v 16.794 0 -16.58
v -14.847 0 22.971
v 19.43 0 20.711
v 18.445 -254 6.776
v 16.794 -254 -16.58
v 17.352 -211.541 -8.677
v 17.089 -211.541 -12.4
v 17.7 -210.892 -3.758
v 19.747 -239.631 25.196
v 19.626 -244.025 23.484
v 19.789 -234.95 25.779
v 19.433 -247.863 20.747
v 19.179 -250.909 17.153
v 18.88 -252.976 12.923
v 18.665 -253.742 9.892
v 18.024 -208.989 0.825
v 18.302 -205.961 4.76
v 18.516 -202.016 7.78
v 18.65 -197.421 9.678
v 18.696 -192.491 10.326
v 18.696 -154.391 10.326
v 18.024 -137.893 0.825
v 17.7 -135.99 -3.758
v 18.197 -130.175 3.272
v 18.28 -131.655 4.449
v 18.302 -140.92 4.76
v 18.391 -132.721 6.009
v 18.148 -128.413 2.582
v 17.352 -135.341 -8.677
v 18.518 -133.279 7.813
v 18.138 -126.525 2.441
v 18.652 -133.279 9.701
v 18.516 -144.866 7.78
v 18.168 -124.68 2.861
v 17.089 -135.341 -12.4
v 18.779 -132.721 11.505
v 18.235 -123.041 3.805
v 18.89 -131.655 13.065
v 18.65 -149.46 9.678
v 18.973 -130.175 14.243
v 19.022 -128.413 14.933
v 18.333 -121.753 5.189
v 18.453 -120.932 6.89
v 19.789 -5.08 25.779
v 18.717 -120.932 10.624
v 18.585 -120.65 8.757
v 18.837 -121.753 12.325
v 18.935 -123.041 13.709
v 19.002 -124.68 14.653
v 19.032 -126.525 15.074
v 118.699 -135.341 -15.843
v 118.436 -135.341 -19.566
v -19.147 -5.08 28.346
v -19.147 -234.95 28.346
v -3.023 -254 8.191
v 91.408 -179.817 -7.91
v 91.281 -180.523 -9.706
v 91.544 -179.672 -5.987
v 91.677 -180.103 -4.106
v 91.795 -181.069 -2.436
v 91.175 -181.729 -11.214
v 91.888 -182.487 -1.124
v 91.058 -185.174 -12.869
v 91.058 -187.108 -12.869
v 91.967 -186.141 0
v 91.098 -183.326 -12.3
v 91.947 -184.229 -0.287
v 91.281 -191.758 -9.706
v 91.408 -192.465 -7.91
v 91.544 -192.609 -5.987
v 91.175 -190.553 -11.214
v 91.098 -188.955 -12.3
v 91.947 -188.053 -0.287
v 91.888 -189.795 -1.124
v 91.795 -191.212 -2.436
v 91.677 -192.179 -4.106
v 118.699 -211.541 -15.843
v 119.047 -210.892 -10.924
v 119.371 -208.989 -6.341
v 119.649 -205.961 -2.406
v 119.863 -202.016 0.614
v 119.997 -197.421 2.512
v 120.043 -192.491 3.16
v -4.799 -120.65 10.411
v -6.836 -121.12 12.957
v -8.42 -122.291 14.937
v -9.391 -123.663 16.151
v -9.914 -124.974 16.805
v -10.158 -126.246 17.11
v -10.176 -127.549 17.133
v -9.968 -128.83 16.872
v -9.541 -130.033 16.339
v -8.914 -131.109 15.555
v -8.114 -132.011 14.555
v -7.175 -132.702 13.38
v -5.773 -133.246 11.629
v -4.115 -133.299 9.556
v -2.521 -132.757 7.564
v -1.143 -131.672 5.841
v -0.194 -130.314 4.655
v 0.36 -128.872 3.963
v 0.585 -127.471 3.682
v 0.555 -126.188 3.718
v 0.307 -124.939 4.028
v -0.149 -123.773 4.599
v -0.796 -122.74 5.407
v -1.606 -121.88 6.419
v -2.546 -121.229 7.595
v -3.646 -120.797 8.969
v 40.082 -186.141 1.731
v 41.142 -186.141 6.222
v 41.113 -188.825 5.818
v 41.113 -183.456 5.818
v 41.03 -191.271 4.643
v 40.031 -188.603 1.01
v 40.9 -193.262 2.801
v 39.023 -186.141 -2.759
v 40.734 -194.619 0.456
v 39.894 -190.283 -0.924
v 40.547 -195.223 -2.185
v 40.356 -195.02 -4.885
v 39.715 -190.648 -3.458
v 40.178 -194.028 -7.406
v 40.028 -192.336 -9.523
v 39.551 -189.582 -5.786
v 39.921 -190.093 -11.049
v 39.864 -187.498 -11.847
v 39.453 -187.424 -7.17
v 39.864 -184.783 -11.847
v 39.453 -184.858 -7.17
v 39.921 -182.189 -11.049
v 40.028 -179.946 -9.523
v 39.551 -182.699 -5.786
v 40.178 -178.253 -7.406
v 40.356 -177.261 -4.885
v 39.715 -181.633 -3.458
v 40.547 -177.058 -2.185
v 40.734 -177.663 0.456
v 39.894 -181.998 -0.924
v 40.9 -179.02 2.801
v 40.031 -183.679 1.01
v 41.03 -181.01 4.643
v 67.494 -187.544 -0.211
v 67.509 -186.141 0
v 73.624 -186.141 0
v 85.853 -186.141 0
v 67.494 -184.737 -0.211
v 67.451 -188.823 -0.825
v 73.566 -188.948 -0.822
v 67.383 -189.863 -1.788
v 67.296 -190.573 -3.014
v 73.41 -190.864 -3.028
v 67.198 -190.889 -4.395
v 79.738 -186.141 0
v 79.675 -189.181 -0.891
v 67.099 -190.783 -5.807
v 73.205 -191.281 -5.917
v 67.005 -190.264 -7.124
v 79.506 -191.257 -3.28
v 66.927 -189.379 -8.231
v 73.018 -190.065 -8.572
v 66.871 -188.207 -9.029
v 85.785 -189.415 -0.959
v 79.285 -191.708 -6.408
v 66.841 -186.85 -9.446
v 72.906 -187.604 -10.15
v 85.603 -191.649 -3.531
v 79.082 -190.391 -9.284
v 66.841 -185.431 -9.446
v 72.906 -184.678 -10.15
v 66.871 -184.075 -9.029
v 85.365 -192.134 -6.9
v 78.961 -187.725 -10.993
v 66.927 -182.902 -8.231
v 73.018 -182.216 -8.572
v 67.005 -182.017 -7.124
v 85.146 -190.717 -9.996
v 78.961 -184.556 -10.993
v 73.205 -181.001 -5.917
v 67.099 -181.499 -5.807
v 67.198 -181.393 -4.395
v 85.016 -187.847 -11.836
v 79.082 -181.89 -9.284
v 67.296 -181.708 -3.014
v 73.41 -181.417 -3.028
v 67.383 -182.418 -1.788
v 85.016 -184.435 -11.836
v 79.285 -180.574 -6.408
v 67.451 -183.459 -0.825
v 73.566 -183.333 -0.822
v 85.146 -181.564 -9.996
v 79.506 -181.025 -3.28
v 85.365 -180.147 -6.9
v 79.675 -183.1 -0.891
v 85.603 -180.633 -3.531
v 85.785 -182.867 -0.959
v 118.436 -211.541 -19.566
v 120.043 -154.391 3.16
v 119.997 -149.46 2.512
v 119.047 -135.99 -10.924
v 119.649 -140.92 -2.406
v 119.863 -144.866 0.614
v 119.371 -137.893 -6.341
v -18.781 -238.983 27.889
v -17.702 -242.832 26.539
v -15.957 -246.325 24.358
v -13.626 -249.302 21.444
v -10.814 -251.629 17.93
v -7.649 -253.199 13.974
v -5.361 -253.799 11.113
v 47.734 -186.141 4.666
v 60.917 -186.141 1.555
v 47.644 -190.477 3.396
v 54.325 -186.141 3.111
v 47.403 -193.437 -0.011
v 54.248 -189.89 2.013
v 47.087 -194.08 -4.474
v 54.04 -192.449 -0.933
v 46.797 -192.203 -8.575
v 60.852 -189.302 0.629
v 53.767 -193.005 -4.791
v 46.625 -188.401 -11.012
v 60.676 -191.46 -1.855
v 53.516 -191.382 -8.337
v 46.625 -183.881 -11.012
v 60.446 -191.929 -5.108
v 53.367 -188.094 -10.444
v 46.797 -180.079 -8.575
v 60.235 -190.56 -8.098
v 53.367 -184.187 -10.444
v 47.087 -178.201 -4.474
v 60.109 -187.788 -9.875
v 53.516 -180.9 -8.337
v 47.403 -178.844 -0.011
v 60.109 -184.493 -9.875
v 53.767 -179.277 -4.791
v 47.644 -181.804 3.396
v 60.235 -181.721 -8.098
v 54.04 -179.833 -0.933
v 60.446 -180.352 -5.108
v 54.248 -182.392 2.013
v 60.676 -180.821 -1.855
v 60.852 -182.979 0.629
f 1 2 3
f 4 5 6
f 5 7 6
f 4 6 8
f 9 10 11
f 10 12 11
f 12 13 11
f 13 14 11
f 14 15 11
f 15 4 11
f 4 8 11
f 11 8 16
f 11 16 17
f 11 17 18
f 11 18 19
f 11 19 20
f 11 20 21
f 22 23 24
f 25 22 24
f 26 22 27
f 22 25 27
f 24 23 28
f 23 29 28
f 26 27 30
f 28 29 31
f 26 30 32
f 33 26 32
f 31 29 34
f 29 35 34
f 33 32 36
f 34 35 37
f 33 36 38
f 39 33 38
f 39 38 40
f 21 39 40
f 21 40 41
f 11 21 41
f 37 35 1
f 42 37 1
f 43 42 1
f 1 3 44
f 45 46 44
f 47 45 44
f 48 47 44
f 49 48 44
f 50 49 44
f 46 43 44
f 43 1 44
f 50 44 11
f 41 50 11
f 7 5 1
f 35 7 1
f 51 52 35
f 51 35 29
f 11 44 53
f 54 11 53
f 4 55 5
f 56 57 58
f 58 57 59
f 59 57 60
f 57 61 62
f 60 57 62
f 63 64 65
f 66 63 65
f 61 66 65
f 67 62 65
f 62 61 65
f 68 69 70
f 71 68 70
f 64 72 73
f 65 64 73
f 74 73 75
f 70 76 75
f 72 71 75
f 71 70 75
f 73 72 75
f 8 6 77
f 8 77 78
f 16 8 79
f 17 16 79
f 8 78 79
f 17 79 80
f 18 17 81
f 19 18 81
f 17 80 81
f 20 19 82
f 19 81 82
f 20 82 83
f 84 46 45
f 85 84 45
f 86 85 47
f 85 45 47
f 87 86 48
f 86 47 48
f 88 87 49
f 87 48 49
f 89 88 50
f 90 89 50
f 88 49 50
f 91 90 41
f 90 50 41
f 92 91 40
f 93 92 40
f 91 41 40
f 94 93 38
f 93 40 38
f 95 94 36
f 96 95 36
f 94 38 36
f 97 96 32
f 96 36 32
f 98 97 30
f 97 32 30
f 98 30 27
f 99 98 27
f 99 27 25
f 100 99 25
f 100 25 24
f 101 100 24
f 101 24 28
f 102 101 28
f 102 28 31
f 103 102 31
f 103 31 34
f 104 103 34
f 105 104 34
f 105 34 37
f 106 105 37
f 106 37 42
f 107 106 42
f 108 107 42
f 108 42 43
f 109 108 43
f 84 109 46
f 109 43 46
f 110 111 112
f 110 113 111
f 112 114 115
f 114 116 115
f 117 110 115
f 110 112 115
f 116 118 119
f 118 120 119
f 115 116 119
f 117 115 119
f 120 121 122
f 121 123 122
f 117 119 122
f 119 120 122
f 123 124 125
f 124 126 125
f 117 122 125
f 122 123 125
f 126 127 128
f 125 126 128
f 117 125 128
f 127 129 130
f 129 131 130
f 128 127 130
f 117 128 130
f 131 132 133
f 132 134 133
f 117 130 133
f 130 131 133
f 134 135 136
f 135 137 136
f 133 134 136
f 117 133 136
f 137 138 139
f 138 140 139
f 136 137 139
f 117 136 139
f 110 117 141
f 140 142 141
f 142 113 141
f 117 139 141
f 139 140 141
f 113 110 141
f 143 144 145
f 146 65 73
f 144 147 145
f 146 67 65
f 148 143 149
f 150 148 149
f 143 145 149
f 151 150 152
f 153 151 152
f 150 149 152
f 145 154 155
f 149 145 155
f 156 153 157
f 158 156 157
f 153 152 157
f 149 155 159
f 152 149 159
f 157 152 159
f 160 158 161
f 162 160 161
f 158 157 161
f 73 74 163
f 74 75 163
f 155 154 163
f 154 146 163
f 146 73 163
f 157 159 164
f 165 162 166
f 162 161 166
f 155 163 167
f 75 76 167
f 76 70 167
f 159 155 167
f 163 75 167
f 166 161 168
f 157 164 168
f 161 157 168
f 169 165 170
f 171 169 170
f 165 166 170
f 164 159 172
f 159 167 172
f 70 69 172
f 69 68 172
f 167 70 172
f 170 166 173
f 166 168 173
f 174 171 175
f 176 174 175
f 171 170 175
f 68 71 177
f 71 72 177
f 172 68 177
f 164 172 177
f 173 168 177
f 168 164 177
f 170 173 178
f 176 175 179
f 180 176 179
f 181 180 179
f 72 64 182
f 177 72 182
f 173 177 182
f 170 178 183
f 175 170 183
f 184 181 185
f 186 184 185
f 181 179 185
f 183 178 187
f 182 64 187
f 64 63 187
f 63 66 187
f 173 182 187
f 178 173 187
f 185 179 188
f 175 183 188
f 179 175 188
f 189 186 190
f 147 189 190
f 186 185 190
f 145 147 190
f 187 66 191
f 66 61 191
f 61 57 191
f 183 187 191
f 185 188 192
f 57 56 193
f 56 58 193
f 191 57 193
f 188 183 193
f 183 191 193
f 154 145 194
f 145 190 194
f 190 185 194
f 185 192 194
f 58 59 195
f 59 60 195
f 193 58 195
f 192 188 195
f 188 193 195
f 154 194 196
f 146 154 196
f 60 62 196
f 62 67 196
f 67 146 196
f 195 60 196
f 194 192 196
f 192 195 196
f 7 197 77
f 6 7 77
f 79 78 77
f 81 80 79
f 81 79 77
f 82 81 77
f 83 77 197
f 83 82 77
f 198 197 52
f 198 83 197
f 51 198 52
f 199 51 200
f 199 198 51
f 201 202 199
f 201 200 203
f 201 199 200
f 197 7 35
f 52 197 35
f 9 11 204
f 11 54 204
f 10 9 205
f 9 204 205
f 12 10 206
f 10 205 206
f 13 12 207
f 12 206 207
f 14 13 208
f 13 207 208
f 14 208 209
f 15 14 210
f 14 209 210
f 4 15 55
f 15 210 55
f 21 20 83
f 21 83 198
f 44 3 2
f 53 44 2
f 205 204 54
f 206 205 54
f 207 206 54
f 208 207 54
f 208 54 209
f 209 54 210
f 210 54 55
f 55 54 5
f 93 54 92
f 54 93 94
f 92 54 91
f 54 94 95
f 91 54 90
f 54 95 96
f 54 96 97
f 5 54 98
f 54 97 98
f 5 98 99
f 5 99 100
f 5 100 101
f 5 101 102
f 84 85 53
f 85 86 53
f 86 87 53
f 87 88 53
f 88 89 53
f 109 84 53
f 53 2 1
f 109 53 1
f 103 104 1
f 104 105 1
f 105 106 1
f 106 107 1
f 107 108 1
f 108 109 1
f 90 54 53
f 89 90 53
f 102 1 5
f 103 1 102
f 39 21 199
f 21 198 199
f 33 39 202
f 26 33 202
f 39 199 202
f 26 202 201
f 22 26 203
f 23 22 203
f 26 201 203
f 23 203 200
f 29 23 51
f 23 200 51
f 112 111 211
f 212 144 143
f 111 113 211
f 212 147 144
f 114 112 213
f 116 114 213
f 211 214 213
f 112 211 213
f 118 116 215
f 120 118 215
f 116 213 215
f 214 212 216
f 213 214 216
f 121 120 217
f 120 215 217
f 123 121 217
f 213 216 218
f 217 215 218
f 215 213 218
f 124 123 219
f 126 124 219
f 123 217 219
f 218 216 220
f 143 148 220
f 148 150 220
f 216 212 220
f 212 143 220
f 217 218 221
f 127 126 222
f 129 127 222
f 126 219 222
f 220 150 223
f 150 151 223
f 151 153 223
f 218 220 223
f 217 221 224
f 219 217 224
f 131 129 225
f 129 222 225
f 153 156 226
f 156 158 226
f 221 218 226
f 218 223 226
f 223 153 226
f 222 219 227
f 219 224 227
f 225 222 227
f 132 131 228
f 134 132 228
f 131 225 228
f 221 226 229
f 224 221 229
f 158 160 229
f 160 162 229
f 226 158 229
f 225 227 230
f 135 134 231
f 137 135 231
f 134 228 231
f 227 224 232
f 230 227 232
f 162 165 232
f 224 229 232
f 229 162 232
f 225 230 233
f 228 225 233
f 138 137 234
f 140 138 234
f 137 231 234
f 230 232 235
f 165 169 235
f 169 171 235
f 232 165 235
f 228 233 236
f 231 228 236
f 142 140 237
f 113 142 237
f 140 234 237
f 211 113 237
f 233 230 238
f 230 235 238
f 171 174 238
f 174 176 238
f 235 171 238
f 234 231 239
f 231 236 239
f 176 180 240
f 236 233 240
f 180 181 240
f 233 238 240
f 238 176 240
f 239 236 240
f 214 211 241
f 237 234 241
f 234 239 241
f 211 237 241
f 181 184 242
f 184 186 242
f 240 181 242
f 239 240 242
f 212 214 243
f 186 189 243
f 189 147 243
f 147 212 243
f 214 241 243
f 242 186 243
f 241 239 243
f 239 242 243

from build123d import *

# Parameters (mm, degrees)
F1_DEPTH = 254
F2_R     = 6.35
F3_DEPTH = 39.0204481418
F4_W     = 76.2
F4_H     = 22.7825300816
F5_DEPTH = 101.6
F9_R     = 19.05
F10_SIZE = 5.08


with BuildPart() as f1:
    # F0 (on Front) → F1 (new body)
    with BuildSketch(Plane.XZ):
        Polygon((-19.1467776895, 28.3457897604), (16.7935416102, -16.5796130896), (19.7885707021, 25.7786232978), align=None)
    extrude(amount=F1_DEPTH)

    # F2 (on face) → F3 (cut, through all)
    with BuildSketch(Plane(origin=(17.876465035, 0, -1.263993438), x_dir=(0, 1, 0), z_dir=(0.9975095855, 0, -0.0705310344))):
        with Locations((-127, 10.0461428802)):
            Circle(F2_R)
    extrude(amount=-F3_DEPTH, mode=Mode.SUBTRACT)

    # F4 (on face) → F5 (join)
    with BuildSketch(Plane(origin=(17.876465035, 0, -1.263993438), x_dir=(0, 1, 0), z_dir=(0.9975095855, 0, -0.0705310344))):
        with Locations((-173.4407693148, 0.2275721636)):
            Rectangle(F4_W, F4_H)
    extrude(amount=F5_DEPTH)

    # F7 (on offset) → F8 (revolve, cut)
    with BuildSketch(Plane(origin=(0, -186.1407693148, 0), x_dir=(-1, 0, 0), z_dir=(0, 1, 0))):
        Polygon((-91.9674258711, 0), (-91.5099222483, -6.4704034611), (-39.0226445365, -2.7591789837), (-41.141692549, 6.2215458602), (-67.5091892481, 0), align=None)
    revolve(axis=Axis((56.3993897732, -186.1407693148, -3.9878386717), (0.9975095855, 0, -0.0705310344)), mode=Mode.SUBTRACT)

    # F9
    f9_edges = [f1.edges().sort_by_distance(p)[0] for p in [
        (69.369441, -135.340769, 6.742931),
        (69.369441, -211.540769, 6.742931),
        (0.320897, -254, 27.062207),
    ]]
    fillet(f9_edges, radius=F9_R)

    # F10
    f10_edges = [f1.edges().sort_by_distance(p)[0] for p in [
        (0.320897, 0, 27.062207),
    ]]
    chamfer(f10_edges, length=F10_SIZE)


solid = f1.part
